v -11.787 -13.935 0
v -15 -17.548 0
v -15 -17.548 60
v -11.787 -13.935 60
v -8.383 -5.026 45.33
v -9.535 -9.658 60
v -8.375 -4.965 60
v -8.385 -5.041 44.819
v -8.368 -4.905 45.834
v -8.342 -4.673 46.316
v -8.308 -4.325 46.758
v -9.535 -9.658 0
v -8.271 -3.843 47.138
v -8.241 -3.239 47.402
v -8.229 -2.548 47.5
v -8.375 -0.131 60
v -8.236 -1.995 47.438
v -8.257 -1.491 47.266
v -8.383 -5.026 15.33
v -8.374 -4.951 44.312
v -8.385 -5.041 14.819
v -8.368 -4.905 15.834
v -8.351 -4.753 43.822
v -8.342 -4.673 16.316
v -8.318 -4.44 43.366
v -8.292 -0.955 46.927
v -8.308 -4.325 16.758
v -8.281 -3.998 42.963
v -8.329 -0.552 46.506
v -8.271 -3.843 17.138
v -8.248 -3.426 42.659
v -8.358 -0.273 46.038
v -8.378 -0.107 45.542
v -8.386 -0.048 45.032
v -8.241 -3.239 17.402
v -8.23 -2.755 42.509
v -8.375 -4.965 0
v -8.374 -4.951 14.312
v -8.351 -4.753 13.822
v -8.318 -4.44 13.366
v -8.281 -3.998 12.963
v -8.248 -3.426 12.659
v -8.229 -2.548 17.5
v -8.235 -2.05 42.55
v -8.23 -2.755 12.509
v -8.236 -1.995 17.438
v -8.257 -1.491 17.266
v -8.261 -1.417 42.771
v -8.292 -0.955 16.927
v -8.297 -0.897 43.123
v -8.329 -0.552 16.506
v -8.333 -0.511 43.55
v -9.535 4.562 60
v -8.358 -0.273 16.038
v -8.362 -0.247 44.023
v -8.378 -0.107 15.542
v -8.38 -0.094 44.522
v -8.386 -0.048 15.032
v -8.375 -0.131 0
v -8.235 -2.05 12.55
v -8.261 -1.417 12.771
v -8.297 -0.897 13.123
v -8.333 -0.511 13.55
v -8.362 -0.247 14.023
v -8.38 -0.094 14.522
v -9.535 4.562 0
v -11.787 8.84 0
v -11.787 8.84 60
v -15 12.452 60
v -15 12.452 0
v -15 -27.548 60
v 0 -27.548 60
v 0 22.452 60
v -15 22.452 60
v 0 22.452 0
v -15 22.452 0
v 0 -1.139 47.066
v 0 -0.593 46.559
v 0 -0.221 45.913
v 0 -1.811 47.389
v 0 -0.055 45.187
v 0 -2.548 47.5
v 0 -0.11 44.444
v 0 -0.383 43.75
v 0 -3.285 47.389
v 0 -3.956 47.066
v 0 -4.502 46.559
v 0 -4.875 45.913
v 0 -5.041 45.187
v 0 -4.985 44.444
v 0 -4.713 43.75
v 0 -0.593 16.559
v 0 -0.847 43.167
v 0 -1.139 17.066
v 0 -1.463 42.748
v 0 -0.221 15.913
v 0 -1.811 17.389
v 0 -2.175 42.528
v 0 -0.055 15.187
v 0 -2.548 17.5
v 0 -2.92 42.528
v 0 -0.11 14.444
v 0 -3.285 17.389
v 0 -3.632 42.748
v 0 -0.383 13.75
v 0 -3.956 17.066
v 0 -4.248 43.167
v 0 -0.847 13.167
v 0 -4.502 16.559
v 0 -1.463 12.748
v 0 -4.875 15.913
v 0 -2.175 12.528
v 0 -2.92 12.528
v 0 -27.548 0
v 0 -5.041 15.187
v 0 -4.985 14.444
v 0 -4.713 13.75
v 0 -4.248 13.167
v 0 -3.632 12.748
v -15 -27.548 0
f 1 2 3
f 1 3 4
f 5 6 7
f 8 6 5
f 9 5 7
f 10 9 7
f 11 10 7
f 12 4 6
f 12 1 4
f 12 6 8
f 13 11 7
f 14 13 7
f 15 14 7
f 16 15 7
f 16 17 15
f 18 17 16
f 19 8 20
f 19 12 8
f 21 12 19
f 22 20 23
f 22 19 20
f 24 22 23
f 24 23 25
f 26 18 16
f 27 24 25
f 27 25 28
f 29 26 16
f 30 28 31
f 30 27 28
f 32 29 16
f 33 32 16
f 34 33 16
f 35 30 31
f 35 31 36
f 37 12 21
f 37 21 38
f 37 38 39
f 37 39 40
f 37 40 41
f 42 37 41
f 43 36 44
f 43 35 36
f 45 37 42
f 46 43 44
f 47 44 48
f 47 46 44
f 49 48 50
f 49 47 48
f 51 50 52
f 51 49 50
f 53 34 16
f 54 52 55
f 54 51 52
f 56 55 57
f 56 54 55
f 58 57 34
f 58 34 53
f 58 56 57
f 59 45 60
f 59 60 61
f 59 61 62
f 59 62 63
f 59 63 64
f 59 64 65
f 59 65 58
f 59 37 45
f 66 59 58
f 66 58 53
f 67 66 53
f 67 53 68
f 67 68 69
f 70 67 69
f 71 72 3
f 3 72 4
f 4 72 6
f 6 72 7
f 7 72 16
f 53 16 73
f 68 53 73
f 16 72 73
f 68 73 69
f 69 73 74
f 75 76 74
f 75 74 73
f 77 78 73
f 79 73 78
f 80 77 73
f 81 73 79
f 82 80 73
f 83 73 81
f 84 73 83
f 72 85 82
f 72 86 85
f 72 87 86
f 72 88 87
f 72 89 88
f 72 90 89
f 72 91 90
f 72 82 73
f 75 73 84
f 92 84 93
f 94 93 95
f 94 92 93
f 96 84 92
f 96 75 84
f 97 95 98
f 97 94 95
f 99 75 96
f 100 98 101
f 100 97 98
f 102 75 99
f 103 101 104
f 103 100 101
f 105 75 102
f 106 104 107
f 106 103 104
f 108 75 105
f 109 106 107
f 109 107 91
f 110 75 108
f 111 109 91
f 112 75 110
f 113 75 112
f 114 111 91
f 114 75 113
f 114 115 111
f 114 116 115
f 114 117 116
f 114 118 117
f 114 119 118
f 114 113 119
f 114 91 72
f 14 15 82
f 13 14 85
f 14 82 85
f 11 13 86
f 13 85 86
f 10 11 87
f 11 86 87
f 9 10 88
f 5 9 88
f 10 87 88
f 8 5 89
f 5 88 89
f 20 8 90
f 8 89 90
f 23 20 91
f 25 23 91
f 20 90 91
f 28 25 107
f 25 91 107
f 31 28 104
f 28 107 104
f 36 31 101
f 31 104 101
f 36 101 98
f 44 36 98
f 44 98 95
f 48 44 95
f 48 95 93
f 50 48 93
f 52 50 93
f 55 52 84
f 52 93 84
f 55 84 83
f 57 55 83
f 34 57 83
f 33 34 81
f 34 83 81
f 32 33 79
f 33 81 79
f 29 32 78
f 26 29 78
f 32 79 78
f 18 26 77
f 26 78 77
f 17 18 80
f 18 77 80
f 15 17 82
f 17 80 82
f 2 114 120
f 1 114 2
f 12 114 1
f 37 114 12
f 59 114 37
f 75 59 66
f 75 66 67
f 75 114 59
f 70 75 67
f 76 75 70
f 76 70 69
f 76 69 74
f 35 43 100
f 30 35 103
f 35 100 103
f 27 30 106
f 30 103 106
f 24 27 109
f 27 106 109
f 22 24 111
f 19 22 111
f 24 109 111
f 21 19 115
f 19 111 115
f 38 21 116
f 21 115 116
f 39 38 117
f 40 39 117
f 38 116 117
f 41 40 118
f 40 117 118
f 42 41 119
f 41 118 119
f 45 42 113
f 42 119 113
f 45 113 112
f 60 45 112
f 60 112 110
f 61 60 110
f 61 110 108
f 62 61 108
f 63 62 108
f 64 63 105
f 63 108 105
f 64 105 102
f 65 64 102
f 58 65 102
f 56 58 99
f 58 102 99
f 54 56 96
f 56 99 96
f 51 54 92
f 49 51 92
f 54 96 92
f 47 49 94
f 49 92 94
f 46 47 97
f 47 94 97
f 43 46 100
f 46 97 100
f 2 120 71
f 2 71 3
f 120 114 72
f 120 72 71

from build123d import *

# Parameters (mm, degrees)
BOSS_EXTRUDE1_DEPTH            = 60
CUT_EXTRUDE1_REACH             = 69.704
CUT_EXTRUDE1_END_RADIUS        = 20
SKETCH3_R                      = 2.5
CUT_EXTRUDE1_DIRECTION_2_DEPTH = 68.704354886


with BuildPart() as part:
    # Sketch2 → Boss-Extrude1 (new body)
    with BuildSketch(Plane.XY):
        with BuildLine():
            Line((0, 22.452229299), (0, -27.547770701))
            Line((0, -27.547770701), (-15, -27.547770701))
            Line((-15, -27.547770701), (-15, -17.547770701))
            ThreePointArc((-15, -17.547770701), (-8.228756555, -2.547770701), (-15, 12.452229299))
            Line((-15, 12.452229299), (-15, 22.452229299))
            Line((-15, 22.452229299), (0, 22.452229299))
        make_face()
    extrude(amount=BOSS_EXTRUDE1_DEPTH)

    # Cut-Extrude1: up to this cylinder (the profile starts outside it)
    cut_extrude1_end = Plane(origin=(-28.228756555, -2.547770701, 30), z_dir=(0, 0, -1)) * Cylinder(CUT_EXTRUDE1_END_RADIUS, 210.408, mode=Mode.PRIVATE)
    # Sketch3 → Cut-Extrude1 (cut, up to the surface)
    with BuildSketch(Plane(origin=(0, 0, 0), x_dir=(0, 0, -1), z_dir=(1, 0, 0)), mode=Mode.PRIVATE) as cut_extrude1_sk1:
        with Locations(Location((-15, -2.547770701, 0), (0, 0, 180))):
            Circle(SKETCH3_R)
    cut_extrude1_tool1 = extrude(cut_extrude1_sk1.sketch, amount=-CUT_EXTRUDE1_REACH, mode=Mode.PRIVATE) - cut_extrude1_end
    add(cut_extrude1_tool1.solids().sort_by_distance((0, -2.547771, 15))[0], mode=Mode.SUBTRACT)
    # Sketch3 → Cut-Extrude1 (cut, up to the surface)
    with BuildSketch(Plane(origin=(0, 0, 0), x_dir=(0, 0, -1), z_dir=(1, 0, 0)), mode=Mode.PRIVATE) as cut_extrude1_sk2:
        with Locations(Location((-45, -2.547770701, 0), (0, 0, 180))):
            Circle(SKETCH3_R)
    cut_extrude1_tool2 = extrude(cut_extrude1_sk2.sketch, amount=-CUT_EXTRUDE1_REACH, mode=Mode.PRIVATE) - cut_extrude1_end
    add(cut_extrude1_tool2.solids().sort_by_distance((0, -2.547771, 45))[0], mode=Mode.SUBTRACT)

    # Sketch3 → Cut-Extrude1 direction 2 (cut)
    with BuildSketch(Plane(origin=(0, 0, 0), x_dir=(0, 0, -1), z_dir=(1, 0, 0))):
        with Locations(Location((-15, -2.547770701, 0), (0, 0, 180))):
            Circle(SKETCH3_R)
        with Locations(Location((-45, -2.547770701, 0), (0, 0, 180))):
            Circle(SKETCH3_R)
    extrude(amount=CUT_EXTRUDE1_DIRECTION_2_DEPTH, mode=Mode.SUBTRACT)


solid = part.part
